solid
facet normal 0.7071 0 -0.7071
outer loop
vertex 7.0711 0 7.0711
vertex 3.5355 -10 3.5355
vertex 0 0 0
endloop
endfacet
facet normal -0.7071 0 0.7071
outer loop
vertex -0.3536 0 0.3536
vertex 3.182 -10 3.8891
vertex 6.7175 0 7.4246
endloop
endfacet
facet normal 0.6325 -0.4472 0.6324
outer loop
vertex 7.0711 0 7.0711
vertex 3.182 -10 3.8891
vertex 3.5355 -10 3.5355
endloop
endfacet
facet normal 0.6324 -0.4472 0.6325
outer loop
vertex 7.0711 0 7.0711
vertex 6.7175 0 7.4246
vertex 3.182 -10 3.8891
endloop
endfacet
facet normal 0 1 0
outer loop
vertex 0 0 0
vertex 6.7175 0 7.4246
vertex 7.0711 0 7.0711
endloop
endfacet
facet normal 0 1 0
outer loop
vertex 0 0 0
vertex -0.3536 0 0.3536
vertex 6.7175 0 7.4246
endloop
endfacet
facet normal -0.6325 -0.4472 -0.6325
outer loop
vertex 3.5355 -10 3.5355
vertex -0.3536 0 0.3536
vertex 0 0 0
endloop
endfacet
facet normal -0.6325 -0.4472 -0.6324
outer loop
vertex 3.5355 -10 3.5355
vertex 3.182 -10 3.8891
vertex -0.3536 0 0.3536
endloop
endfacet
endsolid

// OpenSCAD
include <../waolib/maths.scad>

steps = 1;
lowangle = 315;
highangle = 315;
thickness = 0.5;

tripointsy = [[0,10,0], [0,0,0],[10,5,10]];
tripointsx = [[0,0,0], [10,0,0],[5,10,10]];
tripointsflat = [[0,0,0], [10,0,0],[5,10,0]];

//rotatex();
//rotatey();
//rotateslab();

placetri(tripointsy);

//========================================
//		Functions
//========================================
function PlaneRotations(v) = [ 
	atan2(sqrt(v[0]*v[0]+v[1]*v[1]), v[2]), 
		0, 
		atan2(v[1], v[0])-270];

//========================================
//		Modules
//========================================

module rotateslab()
{
	for (step = [0:steps])
	{
		assign(angle = lowangle + (highangle-lowangle)*step/steps)
		{
			assign(angles=[angle, 0,0])
			{		
echo("Angles: ", angles);
				rotate([angle, 0,0])
				linear_extrude(height =thickness, convexity = 10) 
				polygon(
				points= [[0,0], [10,0], [10,10], [0,10]],
					paths = [[0,1,2,3]]);

				rotate([0, angle,0])
				linear_extrude(height =thickness, convexity = 10) 
				polygon(
				points= [[0,0], [0,10], [-10,10], [-10,0]],
					paths = [[0,1,2,3]]);

				translate([0,0,10])
				rotate([0, 0,angle])
				linear_extrude(height =thickness, convexity = 10) 
				polygon(
				points= [[0,0], [0,10], [-10,10], [-10,0]],
					paths = [[0,1,2,3]]);

			}
		}
	}
}

module rotatex()
{
	for (step = [0:steps])
	{
		assign(angle = lowangle + (highangle-lowangle)*step/steps)
		{
			assign(points = [[-10, 0, 0], [10, 0, 0], [0, 10*cos(angle), 10*sin(angle)]])
			{ 
				assign(normal = VPROD((points[2]-points[1]),(points[0]-points[1])))
				{
					assign(angles = rotations(normal))
					rotate(angles)
					{
		echo("Points: ", points);
		echo("Normal: ", normal);
		echo("Angles: ", angles);
						//cube(size=[30, thickness, 30], center=true);
				
						linear_extrude(height =thickness, convexity = 10) 
						polygon(
						points= [[-10,0], [10,0], [0,20]],
							paths = [[0,1,2]]);
					}
				}
			}
		}
	}
}

module rotatey()
{
	for (step = [0:steps])
	{
		assign(angle = lowangle + (highangle-lowangle)*step/steps)
		{
			assign(points = [[0, 10, 0], [0, -10, 0], [10*cos(angle), 0, 10*sin(angle)]])
			{ 
				assign(normal = VPROD((points[2]-points[1]),(points[0]-points[1])))
				{
					assign(angles = rotations(normal))
					rotate(angles)
					{
		echo("Points: ", points);
		echo("Normal: ", normal);
		echo("ANGLE: ", angle);
		echo("Angles: ", angles);
						//cube(size=[30, thickness, 30], center=true);
				
						linear_extrude(height =thickness, convexity = 10) 
						polygon(
						points= [[0,10], [0,-10], [20,0]],
							paths = [[0,1,2]]);
					}
				}
			}
		}
	}
}


module placetri(tri)
{

	offset = tri[1];

	op0 = tri[0] - offset;
	op1 = tri[1] - offset;
	op2 = tri[2] - offset;

//	v = tri[0]-tri[1];
//	w = tri[2]-tri[1];

	v = op0-op1;
	w = op2-op1;

echo("POINTS: ", tri);
echo("OFFSET: ", offset);
echo("VECTORS: ", v, w);

	normal = VCROSS(w,v);
echo("NORMAL: ", normal);

	angles = PlaneRotations(normal);
echo("ANGLES: ", angles);

	rotate(angles)
	{
		translate(offset)
		linear_extrude(height =thickness, convexity = 10) 
			polygon(
				points= [
					[op0[0],op0[1]], 
					[op1[0], op1[1]], 
					[op2[0],op2[1]]],
				paths = [[0,1,2]]);
	}
}
